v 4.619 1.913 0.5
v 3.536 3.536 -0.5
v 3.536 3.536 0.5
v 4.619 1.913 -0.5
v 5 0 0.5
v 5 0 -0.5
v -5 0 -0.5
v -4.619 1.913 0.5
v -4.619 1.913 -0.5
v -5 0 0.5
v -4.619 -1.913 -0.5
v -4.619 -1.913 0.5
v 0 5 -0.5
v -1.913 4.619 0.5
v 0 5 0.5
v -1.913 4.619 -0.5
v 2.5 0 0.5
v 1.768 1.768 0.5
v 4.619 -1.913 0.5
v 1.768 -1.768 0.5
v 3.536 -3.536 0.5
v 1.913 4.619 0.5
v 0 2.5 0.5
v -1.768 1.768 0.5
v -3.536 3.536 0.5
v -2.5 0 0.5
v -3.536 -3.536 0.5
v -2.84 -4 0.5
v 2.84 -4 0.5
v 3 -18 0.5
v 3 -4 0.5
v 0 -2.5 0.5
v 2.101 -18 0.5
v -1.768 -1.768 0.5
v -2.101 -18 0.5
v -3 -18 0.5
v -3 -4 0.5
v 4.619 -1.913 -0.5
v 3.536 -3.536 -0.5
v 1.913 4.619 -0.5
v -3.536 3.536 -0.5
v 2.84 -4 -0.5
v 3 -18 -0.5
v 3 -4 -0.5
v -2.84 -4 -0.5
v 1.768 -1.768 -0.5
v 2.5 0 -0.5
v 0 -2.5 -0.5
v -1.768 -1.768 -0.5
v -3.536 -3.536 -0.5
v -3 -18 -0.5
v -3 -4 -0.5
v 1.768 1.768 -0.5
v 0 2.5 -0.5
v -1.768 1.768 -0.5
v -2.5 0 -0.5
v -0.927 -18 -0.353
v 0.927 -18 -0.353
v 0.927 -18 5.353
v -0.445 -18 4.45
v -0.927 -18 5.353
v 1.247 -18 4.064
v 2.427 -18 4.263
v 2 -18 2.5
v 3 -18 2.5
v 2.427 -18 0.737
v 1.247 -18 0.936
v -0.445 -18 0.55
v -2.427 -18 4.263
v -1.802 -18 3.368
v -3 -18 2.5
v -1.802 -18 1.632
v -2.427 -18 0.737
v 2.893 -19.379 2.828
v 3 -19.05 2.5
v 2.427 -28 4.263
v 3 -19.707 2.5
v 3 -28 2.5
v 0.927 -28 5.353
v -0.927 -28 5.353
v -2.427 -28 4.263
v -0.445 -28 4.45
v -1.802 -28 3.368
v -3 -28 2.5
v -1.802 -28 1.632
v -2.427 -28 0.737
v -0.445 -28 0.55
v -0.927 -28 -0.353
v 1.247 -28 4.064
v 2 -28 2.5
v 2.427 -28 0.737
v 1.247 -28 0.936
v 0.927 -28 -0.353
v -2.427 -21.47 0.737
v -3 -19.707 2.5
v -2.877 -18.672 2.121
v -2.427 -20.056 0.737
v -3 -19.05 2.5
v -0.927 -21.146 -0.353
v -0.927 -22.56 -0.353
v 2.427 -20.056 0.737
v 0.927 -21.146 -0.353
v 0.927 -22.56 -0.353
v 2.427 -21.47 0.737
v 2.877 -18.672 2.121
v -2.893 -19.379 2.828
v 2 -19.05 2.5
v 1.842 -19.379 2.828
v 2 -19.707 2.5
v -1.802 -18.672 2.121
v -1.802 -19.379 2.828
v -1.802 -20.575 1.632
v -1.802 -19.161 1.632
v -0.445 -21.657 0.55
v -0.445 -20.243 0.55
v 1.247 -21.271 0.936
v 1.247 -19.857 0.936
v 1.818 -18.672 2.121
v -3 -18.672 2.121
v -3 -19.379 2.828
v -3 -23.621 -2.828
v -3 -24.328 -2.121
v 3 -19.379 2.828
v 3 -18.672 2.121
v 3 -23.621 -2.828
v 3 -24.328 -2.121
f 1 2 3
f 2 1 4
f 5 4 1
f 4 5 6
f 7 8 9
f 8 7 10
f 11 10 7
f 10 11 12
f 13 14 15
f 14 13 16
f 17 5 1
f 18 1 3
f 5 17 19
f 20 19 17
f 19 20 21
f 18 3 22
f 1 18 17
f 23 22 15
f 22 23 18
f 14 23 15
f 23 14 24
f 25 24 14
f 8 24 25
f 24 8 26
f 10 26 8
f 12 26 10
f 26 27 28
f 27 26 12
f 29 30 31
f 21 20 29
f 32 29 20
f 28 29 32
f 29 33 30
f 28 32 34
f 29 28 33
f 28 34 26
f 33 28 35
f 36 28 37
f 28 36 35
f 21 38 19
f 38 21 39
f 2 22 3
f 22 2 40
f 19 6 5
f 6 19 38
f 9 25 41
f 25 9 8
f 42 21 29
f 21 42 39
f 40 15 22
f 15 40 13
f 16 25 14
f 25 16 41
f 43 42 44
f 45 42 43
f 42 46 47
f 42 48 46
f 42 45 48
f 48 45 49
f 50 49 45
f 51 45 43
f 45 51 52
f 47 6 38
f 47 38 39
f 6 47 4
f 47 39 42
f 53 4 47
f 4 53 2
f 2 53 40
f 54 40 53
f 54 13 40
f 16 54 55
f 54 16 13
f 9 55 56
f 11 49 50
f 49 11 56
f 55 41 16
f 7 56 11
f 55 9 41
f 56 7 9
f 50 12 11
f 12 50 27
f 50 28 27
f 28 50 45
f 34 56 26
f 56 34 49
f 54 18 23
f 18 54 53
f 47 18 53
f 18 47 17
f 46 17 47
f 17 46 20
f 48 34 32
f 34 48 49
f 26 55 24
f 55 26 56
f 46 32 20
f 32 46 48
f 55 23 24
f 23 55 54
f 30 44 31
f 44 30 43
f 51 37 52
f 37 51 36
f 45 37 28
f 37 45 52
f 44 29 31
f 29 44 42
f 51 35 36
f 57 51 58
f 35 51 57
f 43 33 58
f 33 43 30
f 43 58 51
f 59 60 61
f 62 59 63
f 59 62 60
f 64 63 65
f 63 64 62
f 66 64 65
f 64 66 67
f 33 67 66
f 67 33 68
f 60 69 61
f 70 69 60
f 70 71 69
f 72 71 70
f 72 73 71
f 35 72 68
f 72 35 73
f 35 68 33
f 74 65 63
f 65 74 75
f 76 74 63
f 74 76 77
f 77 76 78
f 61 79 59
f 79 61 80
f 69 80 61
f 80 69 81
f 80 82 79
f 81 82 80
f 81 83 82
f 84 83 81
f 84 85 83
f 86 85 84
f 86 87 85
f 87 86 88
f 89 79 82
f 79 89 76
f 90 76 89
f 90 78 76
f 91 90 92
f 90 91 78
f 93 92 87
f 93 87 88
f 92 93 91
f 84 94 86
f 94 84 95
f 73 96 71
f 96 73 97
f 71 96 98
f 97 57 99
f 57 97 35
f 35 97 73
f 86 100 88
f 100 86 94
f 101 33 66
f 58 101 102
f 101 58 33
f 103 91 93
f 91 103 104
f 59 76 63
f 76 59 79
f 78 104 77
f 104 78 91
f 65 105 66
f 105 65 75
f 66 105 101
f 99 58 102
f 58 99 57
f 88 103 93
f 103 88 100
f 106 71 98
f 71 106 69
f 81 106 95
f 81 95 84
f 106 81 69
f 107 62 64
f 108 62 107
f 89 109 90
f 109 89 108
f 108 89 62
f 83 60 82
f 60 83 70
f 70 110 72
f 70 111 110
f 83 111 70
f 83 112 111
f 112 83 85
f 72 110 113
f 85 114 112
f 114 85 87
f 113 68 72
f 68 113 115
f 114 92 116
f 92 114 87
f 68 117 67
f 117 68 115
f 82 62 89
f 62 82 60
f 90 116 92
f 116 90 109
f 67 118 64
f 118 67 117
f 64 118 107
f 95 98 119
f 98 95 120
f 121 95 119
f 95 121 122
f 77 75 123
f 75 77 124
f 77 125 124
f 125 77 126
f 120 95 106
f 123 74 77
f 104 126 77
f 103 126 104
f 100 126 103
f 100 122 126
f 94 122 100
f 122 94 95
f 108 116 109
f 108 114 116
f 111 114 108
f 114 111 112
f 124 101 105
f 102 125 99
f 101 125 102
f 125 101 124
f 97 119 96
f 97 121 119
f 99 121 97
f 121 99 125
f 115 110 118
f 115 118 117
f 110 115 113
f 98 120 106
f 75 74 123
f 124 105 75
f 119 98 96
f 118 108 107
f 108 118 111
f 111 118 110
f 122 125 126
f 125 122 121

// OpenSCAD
// Parameters
inner_hole_diameter = 5; //[2.5:10:0.1]
outer_ring_diameter = 10; //[6:20:0.1]
tab_width = 6; //[3:12:0.1]
overall_length = 25; //[15:50:0.5]
thickness = 1; //[0.5:3:0.1]
tail_style = 0; //[0:1:1]
crimp_length = 10; //[5:25:0.5]
crimp_outer_diameter = 6; //[4:12:0.1]
crimp_wall_thickness = 1; //[0.5:2:0.1]
bend_angle_deg = 45; //[15:90:1]
transition_length = 1; //[0.5:3:0.1]
overlap = 1; //[0.5:2:0.1]
ring_center_y = 0; //[0:0:1]
tab_length = 14; //[8:30:0.5]

// Ring Terminal - complete geometry
module ring_terminal() {
  color("Silver") {
    // Ring terminal body
    difference() {
      cylinder(r=outer_ring_diameter/2, h=thickness, center=true);
      translate([0, ring_center_y, 0])
        cylinder(r=inner_hole_diameter/2, h=thickness + 2*overlap, center=true);
    }
    // Tab tail
    translate([0, -(outer_ring_diameter/2 + tab_length/2 - overlap), 0])
      cube([tab_width, tab_length, thickness], center=true);
  }
}

// Ring Terminal Assembly - complete geometry
module ring_terminal_assembly() {
  color("Silver") {
    // Crimp barrel
    difference() {
      translate([0, -(outer_ring_diameter/2 + tab_length - overlap + crimp_length/2), crimp_outer_diameter/2 - thickness/2])
        rotate([90, 0, 0])
        cylinder(r=crimp_outer_diameter/2, h=crimp_length, center=true);
      translate([0, -(outer_ring_diameter/2 + tab_length - overlap + crimp_length/2), crimp_outer_diameter/2 - thickness/2])
        rotate([90, 0, 0])
        cylinder(r=crimp_outer_diameter/2 - crimp_wall_thickness, h=crimp_length + 2*overlap, center=true);
    }
    // Bent tongue
    translate([0, -(outer_ring_diameter/2 + tab_length - overlap + (overall_length - (outer_ring_diameter/2 + tab_length) + transition_length)/2), 0])
      rotate([bend_angle_deg, 0, 0])
      cube([tab_width, overall_length - (outer_ring_diameter/2 + tab_length) + transition_length, thickness], center=true);
  }
}

// Assembly
module assembly() {
  ring_terminal();
  ring_terminal_assembly();
}

assembly();
